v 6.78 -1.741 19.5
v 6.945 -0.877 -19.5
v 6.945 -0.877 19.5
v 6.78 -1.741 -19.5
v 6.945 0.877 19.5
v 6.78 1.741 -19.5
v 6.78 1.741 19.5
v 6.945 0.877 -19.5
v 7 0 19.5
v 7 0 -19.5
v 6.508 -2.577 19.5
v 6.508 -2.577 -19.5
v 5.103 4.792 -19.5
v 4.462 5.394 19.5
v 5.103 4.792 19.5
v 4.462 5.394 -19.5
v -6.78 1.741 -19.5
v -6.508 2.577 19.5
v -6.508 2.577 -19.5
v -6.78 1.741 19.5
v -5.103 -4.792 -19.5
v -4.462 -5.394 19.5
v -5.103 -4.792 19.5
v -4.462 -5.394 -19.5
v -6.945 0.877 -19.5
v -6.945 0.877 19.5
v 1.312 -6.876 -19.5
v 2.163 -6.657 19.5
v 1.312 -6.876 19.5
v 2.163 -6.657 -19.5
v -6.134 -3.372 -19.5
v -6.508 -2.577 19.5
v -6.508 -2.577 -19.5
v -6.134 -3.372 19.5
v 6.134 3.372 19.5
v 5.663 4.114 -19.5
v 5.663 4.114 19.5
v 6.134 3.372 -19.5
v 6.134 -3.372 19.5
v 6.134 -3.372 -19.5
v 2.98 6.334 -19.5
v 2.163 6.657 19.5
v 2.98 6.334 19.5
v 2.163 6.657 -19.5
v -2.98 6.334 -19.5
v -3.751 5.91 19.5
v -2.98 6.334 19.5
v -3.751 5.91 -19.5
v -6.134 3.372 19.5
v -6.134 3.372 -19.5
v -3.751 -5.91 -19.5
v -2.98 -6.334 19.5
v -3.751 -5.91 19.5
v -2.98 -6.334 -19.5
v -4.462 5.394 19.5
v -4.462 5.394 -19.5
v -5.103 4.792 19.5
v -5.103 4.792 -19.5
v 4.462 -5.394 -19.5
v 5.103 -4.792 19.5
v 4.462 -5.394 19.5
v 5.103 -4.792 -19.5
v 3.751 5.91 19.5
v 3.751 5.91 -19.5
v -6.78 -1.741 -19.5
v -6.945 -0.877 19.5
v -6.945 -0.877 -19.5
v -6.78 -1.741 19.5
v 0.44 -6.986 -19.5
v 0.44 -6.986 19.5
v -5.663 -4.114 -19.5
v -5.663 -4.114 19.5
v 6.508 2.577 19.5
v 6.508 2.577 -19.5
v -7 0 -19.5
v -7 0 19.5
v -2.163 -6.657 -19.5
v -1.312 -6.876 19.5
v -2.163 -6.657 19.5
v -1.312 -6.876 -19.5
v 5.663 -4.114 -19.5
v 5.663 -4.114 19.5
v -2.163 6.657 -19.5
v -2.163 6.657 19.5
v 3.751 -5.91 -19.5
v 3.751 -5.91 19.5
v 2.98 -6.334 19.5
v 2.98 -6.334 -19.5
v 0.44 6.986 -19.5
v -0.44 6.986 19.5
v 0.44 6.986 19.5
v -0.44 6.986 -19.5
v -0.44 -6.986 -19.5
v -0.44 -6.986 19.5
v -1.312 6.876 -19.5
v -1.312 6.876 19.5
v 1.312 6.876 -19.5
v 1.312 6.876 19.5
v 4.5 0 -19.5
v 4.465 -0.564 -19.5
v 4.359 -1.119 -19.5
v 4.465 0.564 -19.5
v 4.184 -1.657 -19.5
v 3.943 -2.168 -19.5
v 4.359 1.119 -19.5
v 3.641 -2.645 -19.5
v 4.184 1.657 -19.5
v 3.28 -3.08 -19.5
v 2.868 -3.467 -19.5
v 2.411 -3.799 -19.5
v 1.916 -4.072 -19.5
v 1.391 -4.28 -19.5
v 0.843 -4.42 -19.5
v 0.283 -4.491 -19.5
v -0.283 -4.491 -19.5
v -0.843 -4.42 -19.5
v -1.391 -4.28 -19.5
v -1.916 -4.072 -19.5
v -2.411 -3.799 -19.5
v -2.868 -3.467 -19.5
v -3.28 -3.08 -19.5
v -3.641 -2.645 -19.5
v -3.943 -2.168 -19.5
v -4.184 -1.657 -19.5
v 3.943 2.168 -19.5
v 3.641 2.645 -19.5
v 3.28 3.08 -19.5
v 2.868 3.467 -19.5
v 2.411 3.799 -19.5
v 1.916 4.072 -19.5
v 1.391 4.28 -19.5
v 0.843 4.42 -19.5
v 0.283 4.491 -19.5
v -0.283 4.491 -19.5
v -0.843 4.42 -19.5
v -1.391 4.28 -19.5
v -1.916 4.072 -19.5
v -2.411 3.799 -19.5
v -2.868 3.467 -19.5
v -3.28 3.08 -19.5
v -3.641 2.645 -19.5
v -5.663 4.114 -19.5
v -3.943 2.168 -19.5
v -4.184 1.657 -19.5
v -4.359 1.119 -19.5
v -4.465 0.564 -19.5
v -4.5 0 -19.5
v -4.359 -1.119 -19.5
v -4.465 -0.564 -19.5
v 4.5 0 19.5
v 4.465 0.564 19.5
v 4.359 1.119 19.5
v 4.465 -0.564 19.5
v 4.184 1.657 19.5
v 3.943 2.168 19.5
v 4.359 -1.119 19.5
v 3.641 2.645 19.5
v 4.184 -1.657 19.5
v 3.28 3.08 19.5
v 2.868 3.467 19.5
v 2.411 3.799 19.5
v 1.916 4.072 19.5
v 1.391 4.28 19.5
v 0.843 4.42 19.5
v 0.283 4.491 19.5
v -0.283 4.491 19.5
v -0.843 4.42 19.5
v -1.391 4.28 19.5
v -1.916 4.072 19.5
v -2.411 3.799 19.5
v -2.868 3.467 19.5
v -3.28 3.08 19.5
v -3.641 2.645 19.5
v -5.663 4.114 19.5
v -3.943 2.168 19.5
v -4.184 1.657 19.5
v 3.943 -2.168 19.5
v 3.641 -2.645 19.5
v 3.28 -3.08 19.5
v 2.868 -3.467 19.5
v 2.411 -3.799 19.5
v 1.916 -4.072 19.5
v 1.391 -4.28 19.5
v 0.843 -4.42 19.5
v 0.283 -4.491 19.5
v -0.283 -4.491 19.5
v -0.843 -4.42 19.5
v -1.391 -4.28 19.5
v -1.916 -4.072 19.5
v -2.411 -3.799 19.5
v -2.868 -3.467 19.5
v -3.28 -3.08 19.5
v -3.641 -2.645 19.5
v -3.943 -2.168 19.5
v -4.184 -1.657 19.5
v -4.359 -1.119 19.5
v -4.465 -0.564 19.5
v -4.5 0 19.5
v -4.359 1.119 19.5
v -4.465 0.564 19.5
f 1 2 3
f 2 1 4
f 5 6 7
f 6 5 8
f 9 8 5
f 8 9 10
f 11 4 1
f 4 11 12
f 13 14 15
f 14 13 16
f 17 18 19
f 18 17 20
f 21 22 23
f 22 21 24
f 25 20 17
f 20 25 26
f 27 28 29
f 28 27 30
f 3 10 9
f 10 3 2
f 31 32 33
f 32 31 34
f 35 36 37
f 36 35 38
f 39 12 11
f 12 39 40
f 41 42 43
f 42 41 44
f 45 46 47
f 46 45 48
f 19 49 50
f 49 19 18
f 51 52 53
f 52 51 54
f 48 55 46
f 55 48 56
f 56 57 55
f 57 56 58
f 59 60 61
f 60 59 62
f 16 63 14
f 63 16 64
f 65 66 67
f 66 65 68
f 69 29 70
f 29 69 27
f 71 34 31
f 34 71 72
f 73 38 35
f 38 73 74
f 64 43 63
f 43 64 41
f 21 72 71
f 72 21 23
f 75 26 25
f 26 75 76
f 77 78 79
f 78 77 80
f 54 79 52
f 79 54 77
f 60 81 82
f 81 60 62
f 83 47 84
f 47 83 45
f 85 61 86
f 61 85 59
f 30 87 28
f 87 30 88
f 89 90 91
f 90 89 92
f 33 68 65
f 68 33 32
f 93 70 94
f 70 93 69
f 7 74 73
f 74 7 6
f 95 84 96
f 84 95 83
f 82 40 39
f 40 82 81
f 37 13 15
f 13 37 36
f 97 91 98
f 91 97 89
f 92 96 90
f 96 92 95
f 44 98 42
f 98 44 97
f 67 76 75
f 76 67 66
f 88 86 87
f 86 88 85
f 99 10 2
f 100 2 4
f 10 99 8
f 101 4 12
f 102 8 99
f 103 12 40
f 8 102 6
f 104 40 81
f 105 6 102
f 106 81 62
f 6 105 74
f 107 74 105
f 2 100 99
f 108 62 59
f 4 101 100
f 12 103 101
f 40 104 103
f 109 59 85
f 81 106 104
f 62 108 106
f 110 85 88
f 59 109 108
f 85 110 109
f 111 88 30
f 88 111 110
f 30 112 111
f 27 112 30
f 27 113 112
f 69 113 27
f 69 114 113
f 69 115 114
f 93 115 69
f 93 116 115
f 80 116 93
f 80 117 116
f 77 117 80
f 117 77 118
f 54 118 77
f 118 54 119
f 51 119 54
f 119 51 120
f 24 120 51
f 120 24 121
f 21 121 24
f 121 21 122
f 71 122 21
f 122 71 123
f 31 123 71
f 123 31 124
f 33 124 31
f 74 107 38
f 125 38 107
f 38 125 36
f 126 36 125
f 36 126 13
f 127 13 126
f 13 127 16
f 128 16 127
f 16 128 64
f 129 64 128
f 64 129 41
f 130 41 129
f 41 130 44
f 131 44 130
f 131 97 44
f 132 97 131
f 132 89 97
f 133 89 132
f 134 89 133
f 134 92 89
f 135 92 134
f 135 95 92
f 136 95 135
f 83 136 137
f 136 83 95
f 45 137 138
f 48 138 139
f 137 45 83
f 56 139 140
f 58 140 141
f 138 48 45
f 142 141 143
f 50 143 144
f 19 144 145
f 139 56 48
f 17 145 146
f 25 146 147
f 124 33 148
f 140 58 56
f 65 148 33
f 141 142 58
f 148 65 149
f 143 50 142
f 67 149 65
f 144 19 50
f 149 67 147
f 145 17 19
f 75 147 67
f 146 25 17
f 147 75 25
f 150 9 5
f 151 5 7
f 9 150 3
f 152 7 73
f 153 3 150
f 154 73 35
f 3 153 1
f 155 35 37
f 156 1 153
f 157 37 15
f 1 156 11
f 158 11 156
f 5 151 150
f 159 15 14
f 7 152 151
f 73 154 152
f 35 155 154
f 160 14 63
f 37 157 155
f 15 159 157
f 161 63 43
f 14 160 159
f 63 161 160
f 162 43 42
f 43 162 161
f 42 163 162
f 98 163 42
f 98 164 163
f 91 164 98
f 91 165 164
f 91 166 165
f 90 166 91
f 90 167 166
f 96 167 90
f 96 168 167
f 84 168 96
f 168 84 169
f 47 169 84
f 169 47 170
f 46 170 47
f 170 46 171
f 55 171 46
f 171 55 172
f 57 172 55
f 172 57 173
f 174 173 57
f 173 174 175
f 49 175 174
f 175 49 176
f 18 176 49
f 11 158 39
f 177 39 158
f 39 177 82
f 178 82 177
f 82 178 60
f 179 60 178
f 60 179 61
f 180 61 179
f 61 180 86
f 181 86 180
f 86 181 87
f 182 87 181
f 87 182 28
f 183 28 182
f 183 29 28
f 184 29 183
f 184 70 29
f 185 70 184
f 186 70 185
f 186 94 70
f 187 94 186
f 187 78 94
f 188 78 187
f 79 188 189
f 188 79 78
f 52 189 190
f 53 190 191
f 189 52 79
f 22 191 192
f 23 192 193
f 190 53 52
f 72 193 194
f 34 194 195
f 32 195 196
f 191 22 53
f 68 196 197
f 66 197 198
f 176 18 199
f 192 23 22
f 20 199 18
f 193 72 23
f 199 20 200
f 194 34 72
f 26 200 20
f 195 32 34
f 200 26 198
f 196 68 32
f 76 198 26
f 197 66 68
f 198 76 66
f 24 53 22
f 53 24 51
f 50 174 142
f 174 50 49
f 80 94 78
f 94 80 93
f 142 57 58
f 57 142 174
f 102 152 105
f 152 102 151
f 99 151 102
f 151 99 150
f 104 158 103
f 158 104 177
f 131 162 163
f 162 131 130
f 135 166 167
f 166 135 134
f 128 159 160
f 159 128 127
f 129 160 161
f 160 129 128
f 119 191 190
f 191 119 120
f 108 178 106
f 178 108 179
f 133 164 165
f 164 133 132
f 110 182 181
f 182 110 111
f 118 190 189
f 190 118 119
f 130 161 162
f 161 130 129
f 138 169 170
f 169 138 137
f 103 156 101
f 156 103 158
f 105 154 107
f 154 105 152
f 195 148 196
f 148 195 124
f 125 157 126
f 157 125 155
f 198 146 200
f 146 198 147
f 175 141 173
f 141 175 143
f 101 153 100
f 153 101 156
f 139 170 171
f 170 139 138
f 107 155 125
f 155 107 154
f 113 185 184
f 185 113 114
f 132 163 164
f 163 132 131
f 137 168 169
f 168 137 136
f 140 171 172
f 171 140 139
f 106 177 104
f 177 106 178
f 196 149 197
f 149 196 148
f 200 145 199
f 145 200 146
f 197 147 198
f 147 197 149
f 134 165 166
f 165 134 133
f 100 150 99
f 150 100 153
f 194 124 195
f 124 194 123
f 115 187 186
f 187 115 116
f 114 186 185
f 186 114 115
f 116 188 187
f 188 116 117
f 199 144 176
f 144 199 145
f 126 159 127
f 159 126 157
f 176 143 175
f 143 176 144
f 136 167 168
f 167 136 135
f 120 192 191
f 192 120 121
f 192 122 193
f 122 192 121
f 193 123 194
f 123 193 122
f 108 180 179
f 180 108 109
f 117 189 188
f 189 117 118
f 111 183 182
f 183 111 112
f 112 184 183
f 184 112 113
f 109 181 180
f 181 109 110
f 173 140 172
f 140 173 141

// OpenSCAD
$fn = 50;


difference() {
	union() {
		translate(v = [0, 0, -19.5000000000]) {
			cylinder(h = 39, r = 7.0000000000);
		}
	}
	union() {
		translate(v = [0, 0, -100.0000000000]) {
			cylinder(h = 200, r = 4.5000000000);
		}
	}
}
